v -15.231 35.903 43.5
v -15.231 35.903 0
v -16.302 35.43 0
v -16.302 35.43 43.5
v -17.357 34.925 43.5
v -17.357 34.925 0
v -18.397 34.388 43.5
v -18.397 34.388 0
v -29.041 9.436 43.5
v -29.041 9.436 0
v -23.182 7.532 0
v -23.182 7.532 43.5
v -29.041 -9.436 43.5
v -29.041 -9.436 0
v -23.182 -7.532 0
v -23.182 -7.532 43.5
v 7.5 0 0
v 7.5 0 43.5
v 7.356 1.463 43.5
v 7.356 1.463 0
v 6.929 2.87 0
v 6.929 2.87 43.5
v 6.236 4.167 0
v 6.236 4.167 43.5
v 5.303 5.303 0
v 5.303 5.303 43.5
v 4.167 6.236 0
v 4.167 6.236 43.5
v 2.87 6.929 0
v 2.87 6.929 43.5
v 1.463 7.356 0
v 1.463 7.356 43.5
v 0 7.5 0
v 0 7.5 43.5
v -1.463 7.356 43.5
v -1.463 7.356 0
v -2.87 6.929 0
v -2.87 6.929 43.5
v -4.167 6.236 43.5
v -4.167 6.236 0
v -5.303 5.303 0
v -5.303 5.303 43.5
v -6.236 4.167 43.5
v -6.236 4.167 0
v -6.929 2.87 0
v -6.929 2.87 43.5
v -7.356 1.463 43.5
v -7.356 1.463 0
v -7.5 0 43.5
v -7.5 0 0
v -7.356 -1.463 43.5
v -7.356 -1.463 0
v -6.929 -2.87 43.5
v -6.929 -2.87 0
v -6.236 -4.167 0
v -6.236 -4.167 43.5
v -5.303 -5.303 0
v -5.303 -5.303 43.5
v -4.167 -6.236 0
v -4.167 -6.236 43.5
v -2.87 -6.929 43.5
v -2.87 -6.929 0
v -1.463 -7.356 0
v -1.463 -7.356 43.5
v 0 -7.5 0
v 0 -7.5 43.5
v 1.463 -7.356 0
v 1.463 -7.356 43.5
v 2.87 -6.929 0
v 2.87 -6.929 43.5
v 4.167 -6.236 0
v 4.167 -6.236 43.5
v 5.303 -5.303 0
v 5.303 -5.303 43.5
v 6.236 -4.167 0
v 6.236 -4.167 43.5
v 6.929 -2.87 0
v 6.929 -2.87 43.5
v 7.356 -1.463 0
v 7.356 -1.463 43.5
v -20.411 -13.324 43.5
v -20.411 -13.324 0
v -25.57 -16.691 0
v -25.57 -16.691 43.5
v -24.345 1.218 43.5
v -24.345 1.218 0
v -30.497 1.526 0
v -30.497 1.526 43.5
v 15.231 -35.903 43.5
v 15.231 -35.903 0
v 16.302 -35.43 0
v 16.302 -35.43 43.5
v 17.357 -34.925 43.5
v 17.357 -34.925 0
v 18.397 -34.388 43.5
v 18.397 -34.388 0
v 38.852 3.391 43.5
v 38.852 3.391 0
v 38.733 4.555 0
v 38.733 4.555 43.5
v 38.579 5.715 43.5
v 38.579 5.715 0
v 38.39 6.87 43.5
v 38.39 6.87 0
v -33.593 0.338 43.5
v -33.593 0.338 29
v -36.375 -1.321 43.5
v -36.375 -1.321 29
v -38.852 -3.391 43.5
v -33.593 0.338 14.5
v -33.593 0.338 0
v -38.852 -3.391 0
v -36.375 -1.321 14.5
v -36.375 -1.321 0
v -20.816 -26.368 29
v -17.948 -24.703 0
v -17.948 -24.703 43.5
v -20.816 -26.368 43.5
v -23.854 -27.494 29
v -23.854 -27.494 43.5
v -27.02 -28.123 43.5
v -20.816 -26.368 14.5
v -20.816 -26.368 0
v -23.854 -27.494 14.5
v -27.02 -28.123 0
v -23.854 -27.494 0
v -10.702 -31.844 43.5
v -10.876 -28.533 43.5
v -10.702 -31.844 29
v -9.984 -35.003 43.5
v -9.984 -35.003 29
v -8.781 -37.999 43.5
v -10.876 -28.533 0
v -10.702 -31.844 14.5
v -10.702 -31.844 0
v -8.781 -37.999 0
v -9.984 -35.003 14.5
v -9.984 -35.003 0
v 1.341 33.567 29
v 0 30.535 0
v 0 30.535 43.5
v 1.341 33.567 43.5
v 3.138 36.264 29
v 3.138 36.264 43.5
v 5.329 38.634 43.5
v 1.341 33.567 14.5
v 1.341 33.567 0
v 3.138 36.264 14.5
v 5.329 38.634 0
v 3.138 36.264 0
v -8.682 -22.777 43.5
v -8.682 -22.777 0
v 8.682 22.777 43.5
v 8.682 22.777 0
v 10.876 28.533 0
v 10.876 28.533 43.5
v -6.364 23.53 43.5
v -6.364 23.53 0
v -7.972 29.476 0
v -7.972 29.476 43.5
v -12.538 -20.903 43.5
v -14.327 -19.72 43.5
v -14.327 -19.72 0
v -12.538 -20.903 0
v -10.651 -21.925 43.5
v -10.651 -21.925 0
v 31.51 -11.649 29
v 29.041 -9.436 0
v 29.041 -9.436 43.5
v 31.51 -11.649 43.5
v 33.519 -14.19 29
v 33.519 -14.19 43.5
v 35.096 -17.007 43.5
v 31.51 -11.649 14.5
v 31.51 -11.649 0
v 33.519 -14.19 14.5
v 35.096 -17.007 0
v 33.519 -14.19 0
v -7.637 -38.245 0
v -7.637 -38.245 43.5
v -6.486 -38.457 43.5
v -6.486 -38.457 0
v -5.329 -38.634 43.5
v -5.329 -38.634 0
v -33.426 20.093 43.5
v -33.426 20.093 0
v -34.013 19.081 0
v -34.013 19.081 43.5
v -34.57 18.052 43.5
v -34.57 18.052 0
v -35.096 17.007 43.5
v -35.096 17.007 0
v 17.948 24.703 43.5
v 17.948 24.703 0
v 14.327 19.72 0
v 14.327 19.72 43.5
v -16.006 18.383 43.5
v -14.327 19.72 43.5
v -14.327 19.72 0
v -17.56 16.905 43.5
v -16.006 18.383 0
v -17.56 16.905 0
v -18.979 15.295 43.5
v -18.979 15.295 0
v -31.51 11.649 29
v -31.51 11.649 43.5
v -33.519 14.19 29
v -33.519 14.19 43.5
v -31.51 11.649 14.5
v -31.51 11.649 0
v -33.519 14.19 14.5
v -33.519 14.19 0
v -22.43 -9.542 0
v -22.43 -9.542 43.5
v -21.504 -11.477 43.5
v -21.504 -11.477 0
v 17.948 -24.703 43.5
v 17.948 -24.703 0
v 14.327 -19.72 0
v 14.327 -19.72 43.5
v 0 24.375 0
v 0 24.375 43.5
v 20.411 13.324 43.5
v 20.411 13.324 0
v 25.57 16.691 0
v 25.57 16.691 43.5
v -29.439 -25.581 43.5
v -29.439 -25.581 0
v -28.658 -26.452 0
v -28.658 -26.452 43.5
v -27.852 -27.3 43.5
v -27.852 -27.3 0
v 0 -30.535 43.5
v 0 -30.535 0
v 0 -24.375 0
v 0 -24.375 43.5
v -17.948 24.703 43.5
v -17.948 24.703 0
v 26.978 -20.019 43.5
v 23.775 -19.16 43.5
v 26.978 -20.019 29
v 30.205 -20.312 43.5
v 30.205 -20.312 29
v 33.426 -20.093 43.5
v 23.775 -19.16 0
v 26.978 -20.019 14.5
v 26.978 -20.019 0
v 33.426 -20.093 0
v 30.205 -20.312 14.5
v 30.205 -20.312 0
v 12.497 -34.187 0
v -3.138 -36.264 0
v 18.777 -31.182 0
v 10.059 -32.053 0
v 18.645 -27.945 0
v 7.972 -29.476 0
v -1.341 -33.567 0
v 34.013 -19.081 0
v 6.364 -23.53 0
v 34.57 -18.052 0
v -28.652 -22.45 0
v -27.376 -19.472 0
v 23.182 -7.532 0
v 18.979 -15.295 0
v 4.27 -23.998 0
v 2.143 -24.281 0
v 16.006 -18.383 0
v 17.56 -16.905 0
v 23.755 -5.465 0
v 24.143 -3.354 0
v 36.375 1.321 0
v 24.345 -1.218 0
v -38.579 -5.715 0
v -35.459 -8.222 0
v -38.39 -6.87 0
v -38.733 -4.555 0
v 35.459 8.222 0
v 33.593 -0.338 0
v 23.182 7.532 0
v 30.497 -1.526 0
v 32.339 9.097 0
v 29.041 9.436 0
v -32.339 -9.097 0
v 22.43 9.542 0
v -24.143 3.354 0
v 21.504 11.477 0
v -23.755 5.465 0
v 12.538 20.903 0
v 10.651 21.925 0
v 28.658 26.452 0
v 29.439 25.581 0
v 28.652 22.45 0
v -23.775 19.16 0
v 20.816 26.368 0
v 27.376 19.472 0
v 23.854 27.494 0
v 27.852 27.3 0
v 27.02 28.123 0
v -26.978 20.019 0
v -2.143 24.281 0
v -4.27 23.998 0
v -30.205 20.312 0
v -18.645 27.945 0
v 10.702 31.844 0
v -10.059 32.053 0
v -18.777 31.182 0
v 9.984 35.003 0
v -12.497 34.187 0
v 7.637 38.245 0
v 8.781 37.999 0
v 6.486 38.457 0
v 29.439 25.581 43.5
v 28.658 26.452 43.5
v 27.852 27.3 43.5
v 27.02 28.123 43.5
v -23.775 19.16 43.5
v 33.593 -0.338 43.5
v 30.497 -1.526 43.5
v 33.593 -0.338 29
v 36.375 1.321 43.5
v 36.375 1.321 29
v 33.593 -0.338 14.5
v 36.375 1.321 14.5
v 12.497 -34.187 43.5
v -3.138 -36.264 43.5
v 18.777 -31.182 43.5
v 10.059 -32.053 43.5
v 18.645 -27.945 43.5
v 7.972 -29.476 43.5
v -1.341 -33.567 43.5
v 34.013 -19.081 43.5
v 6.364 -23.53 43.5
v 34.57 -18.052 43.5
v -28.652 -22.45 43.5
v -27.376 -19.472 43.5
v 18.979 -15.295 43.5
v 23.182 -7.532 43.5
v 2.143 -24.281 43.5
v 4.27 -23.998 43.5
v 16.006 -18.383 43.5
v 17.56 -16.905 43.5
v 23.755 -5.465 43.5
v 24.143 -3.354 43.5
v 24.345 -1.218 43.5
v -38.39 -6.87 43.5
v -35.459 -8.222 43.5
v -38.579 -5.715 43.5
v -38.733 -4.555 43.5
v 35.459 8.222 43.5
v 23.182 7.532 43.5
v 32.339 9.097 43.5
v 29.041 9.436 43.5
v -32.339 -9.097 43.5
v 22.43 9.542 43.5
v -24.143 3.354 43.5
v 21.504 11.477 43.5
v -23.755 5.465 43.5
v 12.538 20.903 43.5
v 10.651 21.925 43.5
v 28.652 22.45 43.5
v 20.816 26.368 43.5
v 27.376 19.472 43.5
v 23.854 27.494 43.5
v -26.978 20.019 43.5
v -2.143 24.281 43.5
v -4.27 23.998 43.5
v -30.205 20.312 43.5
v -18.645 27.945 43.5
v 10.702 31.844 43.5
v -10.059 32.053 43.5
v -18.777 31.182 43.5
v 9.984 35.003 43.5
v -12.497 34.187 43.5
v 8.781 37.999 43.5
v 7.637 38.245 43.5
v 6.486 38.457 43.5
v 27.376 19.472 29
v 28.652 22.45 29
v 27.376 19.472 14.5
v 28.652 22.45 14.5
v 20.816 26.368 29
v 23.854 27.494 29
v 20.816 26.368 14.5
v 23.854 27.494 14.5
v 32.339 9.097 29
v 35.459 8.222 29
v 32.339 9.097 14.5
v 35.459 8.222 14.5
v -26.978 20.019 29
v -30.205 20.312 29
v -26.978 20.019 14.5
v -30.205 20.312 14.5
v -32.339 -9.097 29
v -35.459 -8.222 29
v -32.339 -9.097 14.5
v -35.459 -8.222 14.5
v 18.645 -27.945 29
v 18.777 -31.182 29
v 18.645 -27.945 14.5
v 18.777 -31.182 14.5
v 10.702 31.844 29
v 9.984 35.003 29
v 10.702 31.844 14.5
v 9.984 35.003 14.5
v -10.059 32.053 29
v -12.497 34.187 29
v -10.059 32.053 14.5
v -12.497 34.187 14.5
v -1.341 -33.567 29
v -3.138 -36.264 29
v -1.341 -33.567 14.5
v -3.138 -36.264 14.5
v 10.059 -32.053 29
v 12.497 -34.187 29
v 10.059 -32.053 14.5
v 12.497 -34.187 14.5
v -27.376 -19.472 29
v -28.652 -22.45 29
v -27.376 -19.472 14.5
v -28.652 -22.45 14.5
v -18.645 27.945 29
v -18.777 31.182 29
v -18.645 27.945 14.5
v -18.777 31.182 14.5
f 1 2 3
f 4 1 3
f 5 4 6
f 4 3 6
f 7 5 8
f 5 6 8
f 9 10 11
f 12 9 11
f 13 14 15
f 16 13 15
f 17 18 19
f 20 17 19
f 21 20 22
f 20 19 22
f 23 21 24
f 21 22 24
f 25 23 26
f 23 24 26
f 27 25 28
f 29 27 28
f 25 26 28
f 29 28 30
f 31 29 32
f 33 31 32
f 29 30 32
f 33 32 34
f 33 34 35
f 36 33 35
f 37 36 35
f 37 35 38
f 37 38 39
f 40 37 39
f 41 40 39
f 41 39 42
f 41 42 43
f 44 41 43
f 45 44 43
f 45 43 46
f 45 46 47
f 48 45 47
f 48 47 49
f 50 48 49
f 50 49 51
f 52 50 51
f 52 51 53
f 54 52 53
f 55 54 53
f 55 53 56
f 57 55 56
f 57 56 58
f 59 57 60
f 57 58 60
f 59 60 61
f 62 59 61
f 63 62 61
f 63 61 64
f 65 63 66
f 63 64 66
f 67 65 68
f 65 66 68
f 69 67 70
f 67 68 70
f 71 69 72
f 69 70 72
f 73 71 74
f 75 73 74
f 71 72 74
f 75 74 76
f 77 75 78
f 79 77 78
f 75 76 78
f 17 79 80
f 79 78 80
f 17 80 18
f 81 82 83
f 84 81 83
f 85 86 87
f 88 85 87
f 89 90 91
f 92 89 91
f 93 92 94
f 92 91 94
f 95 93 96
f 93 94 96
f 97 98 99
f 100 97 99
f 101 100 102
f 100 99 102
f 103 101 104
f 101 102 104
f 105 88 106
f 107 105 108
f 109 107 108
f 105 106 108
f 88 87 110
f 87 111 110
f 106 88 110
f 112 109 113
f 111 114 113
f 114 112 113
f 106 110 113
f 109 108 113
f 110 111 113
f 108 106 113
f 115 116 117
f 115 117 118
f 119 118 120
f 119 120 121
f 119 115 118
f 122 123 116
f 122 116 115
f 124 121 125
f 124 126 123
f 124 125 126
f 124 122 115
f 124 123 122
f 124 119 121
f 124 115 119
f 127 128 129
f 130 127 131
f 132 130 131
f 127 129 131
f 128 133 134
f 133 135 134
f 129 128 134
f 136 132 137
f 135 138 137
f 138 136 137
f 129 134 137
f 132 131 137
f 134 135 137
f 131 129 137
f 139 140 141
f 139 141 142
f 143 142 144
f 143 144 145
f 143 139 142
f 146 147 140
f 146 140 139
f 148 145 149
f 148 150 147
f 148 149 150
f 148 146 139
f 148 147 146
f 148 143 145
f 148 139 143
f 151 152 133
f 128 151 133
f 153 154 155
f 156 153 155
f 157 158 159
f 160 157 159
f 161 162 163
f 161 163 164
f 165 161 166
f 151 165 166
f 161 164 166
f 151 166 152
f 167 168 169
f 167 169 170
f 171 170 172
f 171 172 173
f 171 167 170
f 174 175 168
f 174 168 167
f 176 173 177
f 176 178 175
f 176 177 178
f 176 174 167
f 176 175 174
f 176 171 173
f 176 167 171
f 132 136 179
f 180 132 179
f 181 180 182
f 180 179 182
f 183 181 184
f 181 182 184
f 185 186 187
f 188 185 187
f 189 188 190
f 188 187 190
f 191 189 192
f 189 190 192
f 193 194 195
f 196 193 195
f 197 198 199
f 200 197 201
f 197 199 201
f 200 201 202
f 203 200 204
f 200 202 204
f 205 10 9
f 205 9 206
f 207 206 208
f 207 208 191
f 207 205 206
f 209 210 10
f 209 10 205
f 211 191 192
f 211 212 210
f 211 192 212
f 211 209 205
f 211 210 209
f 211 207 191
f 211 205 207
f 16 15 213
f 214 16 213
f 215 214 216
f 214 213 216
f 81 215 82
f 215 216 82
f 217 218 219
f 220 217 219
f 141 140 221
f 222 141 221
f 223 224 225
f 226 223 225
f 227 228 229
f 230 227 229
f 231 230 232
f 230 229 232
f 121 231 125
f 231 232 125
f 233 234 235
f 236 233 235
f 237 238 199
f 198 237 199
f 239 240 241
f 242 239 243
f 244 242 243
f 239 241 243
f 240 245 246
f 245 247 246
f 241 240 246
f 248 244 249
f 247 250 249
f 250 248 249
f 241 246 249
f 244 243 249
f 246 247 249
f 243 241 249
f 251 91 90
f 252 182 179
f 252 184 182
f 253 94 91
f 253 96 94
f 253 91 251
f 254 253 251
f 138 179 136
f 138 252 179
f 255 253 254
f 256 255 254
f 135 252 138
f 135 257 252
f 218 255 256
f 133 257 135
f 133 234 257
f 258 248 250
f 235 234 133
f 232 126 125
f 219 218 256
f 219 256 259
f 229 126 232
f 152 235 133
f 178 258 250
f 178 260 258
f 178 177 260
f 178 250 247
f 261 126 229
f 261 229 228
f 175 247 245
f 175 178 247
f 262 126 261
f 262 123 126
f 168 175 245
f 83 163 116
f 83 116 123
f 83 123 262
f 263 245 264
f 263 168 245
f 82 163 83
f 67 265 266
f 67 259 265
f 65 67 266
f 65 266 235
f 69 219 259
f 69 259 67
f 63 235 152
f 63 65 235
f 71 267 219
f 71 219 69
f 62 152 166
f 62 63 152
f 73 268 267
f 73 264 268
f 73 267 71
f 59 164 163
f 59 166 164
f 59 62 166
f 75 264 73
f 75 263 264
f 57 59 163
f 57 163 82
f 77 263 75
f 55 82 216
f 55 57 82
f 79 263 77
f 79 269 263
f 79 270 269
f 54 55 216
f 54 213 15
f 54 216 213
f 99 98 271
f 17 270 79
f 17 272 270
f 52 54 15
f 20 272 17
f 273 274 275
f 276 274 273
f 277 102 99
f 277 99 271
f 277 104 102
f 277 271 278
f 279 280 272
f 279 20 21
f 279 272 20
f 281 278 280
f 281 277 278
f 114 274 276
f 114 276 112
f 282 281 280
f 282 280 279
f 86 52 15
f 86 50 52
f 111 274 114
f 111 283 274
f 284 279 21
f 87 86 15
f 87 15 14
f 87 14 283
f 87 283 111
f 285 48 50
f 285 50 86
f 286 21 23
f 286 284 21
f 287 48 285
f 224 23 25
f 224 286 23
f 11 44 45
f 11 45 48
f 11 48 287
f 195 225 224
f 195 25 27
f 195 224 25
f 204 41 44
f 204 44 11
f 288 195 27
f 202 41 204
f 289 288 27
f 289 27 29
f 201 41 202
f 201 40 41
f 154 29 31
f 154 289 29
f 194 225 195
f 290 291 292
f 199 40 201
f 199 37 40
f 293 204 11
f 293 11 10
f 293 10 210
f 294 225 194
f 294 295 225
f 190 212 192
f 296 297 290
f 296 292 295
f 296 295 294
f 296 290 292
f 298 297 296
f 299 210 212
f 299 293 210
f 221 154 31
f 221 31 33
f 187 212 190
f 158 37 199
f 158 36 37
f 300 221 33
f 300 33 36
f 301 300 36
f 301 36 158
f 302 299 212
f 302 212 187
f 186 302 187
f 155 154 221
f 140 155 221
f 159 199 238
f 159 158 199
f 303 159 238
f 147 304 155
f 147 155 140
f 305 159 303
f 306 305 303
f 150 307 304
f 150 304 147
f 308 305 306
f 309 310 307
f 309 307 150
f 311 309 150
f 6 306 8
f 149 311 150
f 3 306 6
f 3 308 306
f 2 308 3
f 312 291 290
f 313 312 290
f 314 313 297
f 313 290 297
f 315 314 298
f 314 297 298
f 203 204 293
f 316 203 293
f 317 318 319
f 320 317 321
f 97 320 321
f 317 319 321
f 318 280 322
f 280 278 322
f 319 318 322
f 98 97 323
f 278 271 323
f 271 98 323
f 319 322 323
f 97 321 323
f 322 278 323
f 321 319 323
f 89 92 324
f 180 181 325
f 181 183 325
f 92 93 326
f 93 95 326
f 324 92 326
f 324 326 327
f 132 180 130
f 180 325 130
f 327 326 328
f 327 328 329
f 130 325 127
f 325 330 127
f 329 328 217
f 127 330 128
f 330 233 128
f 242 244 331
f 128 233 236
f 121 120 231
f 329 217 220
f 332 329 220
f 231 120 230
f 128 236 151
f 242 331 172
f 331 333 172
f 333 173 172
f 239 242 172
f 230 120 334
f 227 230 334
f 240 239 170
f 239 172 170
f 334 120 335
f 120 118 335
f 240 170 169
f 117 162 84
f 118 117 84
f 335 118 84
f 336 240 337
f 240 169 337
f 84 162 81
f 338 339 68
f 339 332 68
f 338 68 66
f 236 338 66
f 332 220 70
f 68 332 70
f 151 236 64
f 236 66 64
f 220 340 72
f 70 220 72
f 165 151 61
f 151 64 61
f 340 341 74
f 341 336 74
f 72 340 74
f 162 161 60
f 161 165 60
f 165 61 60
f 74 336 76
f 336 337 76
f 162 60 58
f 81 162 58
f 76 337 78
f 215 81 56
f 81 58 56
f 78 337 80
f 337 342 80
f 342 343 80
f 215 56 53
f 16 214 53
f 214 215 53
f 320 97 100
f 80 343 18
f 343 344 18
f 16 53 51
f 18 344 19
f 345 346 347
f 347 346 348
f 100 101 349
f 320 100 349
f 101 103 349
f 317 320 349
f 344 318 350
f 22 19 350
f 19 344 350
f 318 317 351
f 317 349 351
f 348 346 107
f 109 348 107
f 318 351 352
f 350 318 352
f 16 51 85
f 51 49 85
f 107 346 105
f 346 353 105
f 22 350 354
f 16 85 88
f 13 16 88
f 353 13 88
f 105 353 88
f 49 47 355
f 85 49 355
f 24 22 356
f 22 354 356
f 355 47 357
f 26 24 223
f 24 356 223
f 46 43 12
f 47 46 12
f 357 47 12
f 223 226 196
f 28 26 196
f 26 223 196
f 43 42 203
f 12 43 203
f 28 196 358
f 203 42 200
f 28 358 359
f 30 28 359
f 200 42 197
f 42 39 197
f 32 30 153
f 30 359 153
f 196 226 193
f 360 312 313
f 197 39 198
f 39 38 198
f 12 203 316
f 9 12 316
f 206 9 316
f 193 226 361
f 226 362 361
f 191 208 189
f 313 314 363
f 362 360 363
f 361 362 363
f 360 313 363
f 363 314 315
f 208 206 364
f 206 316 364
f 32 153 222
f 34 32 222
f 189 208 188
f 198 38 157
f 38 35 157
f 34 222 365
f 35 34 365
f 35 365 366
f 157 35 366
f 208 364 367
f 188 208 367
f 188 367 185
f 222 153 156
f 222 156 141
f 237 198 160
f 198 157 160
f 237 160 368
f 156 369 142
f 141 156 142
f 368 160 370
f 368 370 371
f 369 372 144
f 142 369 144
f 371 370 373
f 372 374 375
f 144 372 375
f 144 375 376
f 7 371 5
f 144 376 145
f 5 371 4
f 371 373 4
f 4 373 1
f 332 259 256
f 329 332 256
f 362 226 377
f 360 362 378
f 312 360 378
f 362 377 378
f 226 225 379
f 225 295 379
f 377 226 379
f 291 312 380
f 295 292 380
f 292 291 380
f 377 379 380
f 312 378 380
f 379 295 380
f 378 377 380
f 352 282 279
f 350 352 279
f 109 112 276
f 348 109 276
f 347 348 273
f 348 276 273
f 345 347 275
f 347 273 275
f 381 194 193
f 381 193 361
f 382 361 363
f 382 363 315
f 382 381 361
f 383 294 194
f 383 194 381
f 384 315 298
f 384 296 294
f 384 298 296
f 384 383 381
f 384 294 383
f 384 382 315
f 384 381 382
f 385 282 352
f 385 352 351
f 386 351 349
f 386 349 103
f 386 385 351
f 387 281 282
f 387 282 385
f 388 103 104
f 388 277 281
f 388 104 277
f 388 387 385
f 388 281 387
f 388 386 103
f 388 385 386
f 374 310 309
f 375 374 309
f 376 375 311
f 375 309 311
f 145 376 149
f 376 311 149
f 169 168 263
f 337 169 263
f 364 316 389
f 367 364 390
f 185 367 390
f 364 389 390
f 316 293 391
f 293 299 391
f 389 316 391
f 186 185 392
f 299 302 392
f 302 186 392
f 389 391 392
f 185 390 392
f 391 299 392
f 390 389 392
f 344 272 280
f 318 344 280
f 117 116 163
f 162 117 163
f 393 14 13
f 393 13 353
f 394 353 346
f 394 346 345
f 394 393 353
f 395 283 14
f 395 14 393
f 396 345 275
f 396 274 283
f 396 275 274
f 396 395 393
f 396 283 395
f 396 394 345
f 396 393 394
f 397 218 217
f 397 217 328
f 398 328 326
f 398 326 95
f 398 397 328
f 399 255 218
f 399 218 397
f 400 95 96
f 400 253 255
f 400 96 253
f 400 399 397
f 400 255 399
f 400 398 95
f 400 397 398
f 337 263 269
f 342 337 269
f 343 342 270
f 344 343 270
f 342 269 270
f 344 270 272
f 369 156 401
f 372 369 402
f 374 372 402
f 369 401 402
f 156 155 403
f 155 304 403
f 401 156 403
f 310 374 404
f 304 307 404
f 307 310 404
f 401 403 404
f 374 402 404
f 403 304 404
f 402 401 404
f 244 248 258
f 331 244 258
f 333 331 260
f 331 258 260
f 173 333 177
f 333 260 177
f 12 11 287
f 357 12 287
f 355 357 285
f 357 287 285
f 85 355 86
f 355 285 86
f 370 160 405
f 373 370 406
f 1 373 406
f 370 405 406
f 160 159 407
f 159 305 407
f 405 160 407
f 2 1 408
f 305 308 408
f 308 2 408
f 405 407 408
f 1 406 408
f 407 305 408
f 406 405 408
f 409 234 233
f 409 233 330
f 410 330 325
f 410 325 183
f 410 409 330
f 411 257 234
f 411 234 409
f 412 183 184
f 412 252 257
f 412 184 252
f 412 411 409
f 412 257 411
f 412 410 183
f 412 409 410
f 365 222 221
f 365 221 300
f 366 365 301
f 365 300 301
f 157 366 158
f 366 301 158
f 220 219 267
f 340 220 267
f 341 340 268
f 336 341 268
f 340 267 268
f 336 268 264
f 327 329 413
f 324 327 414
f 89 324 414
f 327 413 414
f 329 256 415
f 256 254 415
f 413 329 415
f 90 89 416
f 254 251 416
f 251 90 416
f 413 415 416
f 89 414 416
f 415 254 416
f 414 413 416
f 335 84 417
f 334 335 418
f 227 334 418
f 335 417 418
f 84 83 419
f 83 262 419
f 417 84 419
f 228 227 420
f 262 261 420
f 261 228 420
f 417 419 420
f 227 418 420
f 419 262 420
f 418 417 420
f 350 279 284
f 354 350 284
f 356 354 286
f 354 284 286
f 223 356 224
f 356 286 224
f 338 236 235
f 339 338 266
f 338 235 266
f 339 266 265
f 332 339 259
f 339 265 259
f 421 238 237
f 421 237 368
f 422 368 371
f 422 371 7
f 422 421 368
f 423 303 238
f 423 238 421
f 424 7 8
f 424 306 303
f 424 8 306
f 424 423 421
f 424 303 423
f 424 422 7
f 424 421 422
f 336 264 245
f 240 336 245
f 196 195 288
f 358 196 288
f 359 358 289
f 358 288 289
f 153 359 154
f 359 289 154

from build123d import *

# Parameters (mm, degrees)
BOSS_EXTRUDE1_DEPTH = 43.5
CIRPATTERN1_COUNT   = 10
SKETCH2_R           = 7.5
CUT_EXTRUDE1_DEPTH  = 70.959609915


with BuildPart() as part:
    # Sketch1 → Boss-Extrude1 (new body)
    with BuildSketch(Plane.XY):
        with BuildLine():
            add(Edge.make_bspline(
                [(0, 30.535), (1.094025697, 33.738879921), (2.960368297, 36.423385517), (5.329249796, 38.634170065)],
                knots=[0, 0, 0, 0, 0.089409401, 0.089409401, 0.089409401, 0.089409401], degree=3))
            Line((0, 30.535), (0, 24.375))
            ThreePointArc((0, 24.375), (-4.413773565, -23.972050974), (8.681616812, 22.776526393))
            Line((8.681616812, 22.776526393), (10.875617204, 28.532563422))
            add(Edge.make_bspline(
                [(10.875617204, 28.532563422), (10.994458338, 31.915995933), (10.206644899, 35.089189117), (8.780523558, 37.998715847)],
                knots=[0, 0, 0, 0, 0.089409401, 0.089409401, 0.089409401, 0.089409401], degree=3))
            ThreePointArc((8.780523558, 37.998715847), (7.062037704, 38.355281559), (5.329249796, 38.634170065))
        make_face()
    boss_extrude1 = extrude(amount=BOSS_EXTRUDE1_DEPTH)

    # CirPattern1: Boss-Extrude1 ×10 about axis
    cirpattern1_axis = Axis((0, 0, 43.5), (0, 0, 1))
    for i in range(1, CIRPATTERN1_COUNT):
        add(boss_extrude1.rotate(cirpattern1_axis, i * 360 / CIRPATTERN1_COUNT))

    # Sketch2 → Cut-Extrude1 (cut, through all)
    with BuildSketch(Plane.XY.offset(43.5)):
        Circle(SKETCH2_R)
    extrude(amount=-CUT_EXTRUDE1_DEPTH, mode=Mode.SUBTRACT)


solid = part.part
